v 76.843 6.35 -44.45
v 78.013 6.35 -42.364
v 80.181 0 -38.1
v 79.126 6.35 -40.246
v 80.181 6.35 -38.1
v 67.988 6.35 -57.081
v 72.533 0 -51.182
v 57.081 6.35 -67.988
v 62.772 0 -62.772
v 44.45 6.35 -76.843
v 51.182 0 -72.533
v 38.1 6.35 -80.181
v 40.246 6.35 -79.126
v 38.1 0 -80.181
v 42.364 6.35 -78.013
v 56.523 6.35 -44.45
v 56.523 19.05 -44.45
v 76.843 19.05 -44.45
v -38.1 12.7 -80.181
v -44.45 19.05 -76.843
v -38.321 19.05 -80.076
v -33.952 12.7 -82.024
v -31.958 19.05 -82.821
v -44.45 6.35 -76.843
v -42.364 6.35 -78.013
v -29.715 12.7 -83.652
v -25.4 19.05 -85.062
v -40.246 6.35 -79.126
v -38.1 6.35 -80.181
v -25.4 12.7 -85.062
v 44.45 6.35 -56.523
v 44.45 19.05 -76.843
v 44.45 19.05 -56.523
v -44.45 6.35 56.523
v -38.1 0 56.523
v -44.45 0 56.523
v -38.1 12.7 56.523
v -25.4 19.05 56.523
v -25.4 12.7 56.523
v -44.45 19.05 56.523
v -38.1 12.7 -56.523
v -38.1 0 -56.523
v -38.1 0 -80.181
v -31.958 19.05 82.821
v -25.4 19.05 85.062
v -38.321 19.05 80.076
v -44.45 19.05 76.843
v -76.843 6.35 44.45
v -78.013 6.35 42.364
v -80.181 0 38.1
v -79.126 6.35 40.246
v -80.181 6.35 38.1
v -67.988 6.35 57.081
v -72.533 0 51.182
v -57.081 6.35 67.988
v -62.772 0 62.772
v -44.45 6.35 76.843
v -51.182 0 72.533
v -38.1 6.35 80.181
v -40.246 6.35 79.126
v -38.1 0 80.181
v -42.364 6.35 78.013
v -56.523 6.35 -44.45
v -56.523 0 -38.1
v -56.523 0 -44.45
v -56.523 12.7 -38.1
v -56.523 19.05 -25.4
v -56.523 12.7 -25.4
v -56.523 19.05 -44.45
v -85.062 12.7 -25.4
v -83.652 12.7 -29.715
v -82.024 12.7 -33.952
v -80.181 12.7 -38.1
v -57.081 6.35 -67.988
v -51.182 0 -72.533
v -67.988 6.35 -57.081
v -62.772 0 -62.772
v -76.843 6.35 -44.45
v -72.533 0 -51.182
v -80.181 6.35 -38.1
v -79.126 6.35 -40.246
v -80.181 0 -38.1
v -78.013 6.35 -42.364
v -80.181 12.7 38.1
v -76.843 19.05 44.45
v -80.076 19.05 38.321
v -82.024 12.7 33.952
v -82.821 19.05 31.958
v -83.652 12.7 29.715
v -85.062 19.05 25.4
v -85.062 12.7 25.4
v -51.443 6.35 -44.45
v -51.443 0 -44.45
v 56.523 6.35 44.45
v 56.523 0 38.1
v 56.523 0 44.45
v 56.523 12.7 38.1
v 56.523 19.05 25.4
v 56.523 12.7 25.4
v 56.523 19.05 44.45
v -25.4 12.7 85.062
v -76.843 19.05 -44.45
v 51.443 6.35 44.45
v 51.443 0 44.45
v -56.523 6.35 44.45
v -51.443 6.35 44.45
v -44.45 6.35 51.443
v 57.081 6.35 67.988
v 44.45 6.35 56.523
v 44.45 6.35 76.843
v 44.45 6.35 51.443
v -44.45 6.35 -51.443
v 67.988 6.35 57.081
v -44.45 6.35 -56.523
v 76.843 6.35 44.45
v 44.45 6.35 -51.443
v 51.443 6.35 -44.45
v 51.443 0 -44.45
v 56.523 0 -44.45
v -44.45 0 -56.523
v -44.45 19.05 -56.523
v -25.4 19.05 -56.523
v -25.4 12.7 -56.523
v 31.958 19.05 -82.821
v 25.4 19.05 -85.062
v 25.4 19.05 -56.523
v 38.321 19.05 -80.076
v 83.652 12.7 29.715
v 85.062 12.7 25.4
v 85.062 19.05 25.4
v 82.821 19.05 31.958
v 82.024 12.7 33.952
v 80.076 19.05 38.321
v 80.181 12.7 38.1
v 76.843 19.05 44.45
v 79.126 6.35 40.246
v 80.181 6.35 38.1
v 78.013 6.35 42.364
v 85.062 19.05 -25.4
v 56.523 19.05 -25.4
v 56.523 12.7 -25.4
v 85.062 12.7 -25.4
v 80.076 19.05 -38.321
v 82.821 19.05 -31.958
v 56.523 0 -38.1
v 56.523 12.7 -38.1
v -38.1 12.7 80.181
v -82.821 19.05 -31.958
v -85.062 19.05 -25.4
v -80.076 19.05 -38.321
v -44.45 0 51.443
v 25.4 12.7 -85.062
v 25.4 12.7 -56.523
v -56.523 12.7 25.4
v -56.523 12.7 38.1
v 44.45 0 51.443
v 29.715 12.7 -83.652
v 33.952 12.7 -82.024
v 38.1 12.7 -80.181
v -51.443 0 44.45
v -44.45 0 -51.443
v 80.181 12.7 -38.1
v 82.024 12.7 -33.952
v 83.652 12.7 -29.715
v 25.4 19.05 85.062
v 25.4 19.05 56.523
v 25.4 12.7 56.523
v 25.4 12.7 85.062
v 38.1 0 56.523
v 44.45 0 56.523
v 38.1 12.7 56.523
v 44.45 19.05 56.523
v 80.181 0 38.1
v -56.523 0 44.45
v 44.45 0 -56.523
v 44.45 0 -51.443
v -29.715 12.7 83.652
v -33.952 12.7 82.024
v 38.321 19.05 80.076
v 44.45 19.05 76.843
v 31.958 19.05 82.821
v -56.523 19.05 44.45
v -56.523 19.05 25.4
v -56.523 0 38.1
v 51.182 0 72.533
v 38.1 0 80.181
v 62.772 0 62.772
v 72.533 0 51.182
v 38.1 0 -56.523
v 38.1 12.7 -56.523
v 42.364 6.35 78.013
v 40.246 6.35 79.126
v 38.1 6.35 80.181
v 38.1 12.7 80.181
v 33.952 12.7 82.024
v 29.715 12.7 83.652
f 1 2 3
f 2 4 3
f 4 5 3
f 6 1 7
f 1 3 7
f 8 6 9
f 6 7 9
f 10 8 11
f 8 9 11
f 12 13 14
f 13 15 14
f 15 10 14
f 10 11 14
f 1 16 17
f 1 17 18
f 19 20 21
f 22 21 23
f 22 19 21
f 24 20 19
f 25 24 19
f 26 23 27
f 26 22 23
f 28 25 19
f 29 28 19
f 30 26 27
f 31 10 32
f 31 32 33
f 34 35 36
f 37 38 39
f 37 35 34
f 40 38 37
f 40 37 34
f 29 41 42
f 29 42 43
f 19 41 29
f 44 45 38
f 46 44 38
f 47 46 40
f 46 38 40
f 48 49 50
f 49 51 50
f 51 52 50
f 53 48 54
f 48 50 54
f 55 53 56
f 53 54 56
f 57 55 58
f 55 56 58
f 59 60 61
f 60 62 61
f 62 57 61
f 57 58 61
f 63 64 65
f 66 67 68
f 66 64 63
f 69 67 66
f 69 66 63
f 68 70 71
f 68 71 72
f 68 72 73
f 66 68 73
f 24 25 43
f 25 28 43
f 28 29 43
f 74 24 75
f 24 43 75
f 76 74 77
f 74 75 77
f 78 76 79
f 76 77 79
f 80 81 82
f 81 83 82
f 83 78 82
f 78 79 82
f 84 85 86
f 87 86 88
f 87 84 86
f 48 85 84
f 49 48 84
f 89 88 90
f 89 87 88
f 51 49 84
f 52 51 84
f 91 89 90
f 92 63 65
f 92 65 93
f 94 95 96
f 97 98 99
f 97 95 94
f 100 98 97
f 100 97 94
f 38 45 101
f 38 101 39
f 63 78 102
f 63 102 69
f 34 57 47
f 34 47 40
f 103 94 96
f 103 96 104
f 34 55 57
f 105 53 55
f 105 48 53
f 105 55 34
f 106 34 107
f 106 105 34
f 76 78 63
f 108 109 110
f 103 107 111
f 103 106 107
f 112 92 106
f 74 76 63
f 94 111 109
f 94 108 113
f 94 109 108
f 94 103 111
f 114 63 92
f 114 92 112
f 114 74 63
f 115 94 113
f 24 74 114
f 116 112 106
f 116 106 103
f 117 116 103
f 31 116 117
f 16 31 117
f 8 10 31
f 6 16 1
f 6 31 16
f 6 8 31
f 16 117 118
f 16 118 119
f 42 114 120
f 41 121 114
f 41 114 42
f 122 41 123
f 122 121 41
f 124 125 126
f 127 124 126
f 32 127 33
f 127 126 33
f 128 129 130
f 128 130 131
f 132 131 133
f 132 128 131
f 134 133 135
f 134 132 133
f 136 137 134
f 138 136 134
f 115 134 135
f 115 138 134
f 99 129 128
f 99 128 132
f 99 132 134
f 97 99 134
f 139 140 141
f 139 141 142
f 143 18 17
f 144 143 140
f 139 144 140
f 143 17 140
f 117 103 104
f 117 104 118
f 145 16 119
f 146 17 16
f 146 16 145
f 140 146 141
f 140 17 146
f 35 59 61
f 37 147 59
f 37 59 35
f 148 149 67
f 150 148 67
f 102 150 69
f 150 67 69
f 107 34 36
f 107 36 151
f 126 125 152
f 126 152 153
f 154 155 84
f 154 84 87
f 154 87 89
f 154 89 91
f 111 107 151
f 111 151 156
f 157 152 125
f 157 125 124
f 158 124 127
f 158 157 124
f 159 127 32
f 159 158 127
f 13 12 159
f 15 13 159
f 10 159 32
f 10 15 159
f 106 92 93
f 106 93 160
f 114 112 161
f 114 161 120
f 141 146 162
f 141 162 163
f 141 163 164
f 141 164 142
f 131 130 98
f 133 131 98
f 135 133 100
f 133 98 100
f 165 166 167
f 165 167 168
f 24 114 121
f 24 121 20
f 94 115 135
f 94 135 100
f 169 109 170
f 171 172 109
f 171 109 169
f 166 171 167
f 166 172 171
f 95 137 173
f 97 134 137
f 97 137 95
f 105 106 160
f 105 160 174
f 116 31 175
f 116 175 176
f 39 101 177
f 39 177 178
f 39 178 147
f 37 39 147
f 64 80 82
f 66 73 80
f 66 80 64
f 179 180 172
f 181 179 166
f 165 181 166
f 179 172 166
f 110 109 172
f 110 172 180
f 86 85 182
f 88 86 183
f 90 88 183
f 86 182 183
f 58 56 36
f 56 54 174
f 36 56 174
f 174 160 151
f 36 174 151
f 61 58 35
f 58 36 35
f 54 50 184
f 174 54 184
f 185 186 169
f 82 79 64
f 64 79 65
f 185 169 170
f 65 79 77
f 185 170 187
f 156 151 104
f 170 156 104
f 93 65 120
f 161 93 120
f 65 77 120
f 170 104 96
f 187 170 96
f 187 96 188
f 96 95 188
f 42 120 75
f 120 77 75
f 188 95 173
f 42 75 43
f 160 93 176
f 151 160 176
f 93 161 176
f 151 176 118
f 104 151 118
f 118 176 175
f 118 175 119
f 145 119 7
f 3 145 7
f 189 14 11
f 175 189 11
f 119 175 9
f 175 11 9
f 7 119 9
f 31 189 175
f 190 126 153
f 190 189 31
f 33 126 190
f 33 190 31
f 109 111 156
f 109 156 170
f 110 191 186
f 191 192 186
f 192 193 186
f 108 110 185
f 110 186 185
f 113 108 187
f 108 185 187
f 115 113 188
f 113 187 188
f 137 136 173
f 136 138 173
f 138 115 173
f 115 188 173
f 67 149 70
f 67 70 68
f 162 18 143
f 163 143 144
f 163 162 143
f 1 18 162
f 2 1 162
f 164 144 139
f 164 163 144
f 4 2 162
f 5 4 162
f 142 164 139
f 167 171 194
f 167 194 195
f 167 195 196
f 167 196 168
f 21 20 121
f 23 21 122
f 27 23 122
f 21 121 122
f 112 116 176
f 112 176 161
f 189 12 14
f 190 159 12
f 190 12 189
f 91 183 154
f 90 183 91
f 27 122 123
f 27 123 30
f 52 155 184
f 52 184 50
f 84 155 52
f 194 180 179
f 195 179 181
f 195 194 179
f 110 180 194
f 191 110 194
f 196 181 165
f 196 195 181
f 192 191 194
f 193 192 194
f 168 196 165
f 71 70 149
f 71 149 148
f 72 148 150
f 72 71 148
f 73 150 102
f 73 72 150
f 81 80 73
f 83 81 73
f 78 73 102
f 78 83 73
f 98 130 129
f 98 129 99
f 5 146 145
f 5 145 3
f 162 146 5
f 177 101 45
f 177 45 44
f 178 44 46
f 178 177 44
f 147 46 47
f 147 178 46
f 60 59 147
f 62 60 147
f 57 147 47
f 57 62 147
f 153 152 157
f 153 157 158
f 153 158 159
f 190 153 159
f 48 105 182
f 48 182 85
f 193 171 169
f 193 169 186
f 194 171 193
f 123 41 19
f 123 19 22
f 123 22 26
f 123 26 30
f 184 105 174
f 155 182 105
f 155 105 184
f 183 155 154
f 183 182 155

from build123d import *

# Parameters (mm, degrees)
SKETCH1_R          = 88.773
BASE_DEPTH         = 6.35
STOPPER_DEPTH      = 12.7
STOPPER_START      = -6.35
STOPPER_GAP_DEPTH  = 13.7
OVERHANG_CUT_DEPTH = 26.416
CIRPATTERN1_COUNT  = 4


with BuildPart() as part:
    # Sketch1 → Base (new body)
    with BuildSketch(Plane(origin=(0, 0, 0), x_dir=(1, 0, 0), z_dir=(0, 1, 0))):
        Circle(SKETCH1_R)
    extrude(amount=BASE_DEPTH)

    # Sketch2 → Stopper (add)
    with BuildSketch(Plane(origin=(0, 6.35, 0), x_dir=(1, 0, 0), z_dir=(0, 1, 0))):
        with BuildLine():
            Line((-44.45, -76.842976445), (-44.45, -51.442976445))
            Line((-44.45, -51.442976445), (0, -51.442976445))
            Line((0, -51.442976445), (44.45, -51.442976445))
            Line((44.45, -51.442976445), (44.45, -76.842976445))
            ThreePointArc((44.45, -76.842976445), (23.011562105, -85.73863504), (0, -88.773))
            ThreePointArc((0, -88.773), (-23.011562105, -85.73863504), (-44.45, -76.842976445))
        make_face()
    stopper = extrude(amount=STOPPER_DEPTH)

    # Sketch5 → Stopper Gap (cut, through all)
    with BuildSketch(Plane(origin=(0, 19.05, 0), x_dir=(1, 0, 0), z_dir=(0, 1, 0)).offset(STOPPER_START)):
        with BuildLine():
            Line((-38.10000012, -80.181266639), (-38.10000012, -51.442976445))
            Line((-38.10000012, -51.442976445), (-1.2e-07, -51.442976445))
            Line((-1.2e-07, -51.442976445), (38.09999988, -51.442976445))
            Line((38.09999988, -51.442976445), (38.10000012, -80.181266639))
            ThreePointArc((38.10000012, -80.181266639), (19.528363291, -86.598432758), (0, -88.773))
            ThreePointArc((0, -88.773), (-19.528363291, -86.598432758), (-38.10000012, -80.181266639))
        make_face()
    stopper_gap = extrude(amount=-STOPPER_GAP_DEPTH, mode=Mode.SUBTRACT)

    # Sketch6 → Overhang cut (cut)
    with BuildSketch(Plane(origin=(0, 19.05, 0), x_dir=(1, 0, 0), z_dir=(0, 1, 0))):
        with BuildLine():
            Line((-25.4, -51.442976445), (0, -51.442976445))
            Line((0, -51.442976445), (25.4, -51.442976445))
            Line((25.4, -51.442976445), (44.45, -51.442976445))
            Line((44.45, -51.442976445), (44.45, -56.522976445))
            Line((44.45, -56.522976445), (25.4, -56.522976445))
            Line((25.4, -56.522976445), (25.4, -85.06165722))
            ThreePointArc((25.4, -85.06165722), (12.834855523, -87.840264188), (0, -88.773))
            ThreePointArc((0, -88.773), (-12.834855523, -87.840264188), (-25.4, -85.06165722))
            Line((-25.4, -85.06165722), (-25.4, -56.522976445))
            Line((-25.4, -56.522976445), (-44.45, -56.522976445))
            Line((-44.45, -56.522976445), (-44.45, -51.442976445))
            Line((-44.45, -51.442976445), (-25.4, -51.442976445))
        make_face()
    overhang_cut = extrude(amount=-OVERHANG_CUT_DEPTH, mode=Mode.SUBTRACT)

    # CirPattern1: Stopper, Stopper Gap, Overhang cut ×4 about axis
    cirpattern1_axis = Axis((0, 0, 0), (0, 1, 0))
    for i in range(1, CIRPATTERN1_COUNT):
        add(stopper.rotate(cirpattern1_axis, i * 360 / CIRPATTERN1_COUNT))
        add(stopper_gap.rotate(cirpattern1_axis, i * 360 / CIRPATTERN1_COUNT), mode=Mode.SUBTRACT)
        add(overhang_cut.rotate(cirpattern1_axis, i * 360 / CIRPATTERN1_COUNT), mode=Mode.SUBTRACT)


solid = part.part
